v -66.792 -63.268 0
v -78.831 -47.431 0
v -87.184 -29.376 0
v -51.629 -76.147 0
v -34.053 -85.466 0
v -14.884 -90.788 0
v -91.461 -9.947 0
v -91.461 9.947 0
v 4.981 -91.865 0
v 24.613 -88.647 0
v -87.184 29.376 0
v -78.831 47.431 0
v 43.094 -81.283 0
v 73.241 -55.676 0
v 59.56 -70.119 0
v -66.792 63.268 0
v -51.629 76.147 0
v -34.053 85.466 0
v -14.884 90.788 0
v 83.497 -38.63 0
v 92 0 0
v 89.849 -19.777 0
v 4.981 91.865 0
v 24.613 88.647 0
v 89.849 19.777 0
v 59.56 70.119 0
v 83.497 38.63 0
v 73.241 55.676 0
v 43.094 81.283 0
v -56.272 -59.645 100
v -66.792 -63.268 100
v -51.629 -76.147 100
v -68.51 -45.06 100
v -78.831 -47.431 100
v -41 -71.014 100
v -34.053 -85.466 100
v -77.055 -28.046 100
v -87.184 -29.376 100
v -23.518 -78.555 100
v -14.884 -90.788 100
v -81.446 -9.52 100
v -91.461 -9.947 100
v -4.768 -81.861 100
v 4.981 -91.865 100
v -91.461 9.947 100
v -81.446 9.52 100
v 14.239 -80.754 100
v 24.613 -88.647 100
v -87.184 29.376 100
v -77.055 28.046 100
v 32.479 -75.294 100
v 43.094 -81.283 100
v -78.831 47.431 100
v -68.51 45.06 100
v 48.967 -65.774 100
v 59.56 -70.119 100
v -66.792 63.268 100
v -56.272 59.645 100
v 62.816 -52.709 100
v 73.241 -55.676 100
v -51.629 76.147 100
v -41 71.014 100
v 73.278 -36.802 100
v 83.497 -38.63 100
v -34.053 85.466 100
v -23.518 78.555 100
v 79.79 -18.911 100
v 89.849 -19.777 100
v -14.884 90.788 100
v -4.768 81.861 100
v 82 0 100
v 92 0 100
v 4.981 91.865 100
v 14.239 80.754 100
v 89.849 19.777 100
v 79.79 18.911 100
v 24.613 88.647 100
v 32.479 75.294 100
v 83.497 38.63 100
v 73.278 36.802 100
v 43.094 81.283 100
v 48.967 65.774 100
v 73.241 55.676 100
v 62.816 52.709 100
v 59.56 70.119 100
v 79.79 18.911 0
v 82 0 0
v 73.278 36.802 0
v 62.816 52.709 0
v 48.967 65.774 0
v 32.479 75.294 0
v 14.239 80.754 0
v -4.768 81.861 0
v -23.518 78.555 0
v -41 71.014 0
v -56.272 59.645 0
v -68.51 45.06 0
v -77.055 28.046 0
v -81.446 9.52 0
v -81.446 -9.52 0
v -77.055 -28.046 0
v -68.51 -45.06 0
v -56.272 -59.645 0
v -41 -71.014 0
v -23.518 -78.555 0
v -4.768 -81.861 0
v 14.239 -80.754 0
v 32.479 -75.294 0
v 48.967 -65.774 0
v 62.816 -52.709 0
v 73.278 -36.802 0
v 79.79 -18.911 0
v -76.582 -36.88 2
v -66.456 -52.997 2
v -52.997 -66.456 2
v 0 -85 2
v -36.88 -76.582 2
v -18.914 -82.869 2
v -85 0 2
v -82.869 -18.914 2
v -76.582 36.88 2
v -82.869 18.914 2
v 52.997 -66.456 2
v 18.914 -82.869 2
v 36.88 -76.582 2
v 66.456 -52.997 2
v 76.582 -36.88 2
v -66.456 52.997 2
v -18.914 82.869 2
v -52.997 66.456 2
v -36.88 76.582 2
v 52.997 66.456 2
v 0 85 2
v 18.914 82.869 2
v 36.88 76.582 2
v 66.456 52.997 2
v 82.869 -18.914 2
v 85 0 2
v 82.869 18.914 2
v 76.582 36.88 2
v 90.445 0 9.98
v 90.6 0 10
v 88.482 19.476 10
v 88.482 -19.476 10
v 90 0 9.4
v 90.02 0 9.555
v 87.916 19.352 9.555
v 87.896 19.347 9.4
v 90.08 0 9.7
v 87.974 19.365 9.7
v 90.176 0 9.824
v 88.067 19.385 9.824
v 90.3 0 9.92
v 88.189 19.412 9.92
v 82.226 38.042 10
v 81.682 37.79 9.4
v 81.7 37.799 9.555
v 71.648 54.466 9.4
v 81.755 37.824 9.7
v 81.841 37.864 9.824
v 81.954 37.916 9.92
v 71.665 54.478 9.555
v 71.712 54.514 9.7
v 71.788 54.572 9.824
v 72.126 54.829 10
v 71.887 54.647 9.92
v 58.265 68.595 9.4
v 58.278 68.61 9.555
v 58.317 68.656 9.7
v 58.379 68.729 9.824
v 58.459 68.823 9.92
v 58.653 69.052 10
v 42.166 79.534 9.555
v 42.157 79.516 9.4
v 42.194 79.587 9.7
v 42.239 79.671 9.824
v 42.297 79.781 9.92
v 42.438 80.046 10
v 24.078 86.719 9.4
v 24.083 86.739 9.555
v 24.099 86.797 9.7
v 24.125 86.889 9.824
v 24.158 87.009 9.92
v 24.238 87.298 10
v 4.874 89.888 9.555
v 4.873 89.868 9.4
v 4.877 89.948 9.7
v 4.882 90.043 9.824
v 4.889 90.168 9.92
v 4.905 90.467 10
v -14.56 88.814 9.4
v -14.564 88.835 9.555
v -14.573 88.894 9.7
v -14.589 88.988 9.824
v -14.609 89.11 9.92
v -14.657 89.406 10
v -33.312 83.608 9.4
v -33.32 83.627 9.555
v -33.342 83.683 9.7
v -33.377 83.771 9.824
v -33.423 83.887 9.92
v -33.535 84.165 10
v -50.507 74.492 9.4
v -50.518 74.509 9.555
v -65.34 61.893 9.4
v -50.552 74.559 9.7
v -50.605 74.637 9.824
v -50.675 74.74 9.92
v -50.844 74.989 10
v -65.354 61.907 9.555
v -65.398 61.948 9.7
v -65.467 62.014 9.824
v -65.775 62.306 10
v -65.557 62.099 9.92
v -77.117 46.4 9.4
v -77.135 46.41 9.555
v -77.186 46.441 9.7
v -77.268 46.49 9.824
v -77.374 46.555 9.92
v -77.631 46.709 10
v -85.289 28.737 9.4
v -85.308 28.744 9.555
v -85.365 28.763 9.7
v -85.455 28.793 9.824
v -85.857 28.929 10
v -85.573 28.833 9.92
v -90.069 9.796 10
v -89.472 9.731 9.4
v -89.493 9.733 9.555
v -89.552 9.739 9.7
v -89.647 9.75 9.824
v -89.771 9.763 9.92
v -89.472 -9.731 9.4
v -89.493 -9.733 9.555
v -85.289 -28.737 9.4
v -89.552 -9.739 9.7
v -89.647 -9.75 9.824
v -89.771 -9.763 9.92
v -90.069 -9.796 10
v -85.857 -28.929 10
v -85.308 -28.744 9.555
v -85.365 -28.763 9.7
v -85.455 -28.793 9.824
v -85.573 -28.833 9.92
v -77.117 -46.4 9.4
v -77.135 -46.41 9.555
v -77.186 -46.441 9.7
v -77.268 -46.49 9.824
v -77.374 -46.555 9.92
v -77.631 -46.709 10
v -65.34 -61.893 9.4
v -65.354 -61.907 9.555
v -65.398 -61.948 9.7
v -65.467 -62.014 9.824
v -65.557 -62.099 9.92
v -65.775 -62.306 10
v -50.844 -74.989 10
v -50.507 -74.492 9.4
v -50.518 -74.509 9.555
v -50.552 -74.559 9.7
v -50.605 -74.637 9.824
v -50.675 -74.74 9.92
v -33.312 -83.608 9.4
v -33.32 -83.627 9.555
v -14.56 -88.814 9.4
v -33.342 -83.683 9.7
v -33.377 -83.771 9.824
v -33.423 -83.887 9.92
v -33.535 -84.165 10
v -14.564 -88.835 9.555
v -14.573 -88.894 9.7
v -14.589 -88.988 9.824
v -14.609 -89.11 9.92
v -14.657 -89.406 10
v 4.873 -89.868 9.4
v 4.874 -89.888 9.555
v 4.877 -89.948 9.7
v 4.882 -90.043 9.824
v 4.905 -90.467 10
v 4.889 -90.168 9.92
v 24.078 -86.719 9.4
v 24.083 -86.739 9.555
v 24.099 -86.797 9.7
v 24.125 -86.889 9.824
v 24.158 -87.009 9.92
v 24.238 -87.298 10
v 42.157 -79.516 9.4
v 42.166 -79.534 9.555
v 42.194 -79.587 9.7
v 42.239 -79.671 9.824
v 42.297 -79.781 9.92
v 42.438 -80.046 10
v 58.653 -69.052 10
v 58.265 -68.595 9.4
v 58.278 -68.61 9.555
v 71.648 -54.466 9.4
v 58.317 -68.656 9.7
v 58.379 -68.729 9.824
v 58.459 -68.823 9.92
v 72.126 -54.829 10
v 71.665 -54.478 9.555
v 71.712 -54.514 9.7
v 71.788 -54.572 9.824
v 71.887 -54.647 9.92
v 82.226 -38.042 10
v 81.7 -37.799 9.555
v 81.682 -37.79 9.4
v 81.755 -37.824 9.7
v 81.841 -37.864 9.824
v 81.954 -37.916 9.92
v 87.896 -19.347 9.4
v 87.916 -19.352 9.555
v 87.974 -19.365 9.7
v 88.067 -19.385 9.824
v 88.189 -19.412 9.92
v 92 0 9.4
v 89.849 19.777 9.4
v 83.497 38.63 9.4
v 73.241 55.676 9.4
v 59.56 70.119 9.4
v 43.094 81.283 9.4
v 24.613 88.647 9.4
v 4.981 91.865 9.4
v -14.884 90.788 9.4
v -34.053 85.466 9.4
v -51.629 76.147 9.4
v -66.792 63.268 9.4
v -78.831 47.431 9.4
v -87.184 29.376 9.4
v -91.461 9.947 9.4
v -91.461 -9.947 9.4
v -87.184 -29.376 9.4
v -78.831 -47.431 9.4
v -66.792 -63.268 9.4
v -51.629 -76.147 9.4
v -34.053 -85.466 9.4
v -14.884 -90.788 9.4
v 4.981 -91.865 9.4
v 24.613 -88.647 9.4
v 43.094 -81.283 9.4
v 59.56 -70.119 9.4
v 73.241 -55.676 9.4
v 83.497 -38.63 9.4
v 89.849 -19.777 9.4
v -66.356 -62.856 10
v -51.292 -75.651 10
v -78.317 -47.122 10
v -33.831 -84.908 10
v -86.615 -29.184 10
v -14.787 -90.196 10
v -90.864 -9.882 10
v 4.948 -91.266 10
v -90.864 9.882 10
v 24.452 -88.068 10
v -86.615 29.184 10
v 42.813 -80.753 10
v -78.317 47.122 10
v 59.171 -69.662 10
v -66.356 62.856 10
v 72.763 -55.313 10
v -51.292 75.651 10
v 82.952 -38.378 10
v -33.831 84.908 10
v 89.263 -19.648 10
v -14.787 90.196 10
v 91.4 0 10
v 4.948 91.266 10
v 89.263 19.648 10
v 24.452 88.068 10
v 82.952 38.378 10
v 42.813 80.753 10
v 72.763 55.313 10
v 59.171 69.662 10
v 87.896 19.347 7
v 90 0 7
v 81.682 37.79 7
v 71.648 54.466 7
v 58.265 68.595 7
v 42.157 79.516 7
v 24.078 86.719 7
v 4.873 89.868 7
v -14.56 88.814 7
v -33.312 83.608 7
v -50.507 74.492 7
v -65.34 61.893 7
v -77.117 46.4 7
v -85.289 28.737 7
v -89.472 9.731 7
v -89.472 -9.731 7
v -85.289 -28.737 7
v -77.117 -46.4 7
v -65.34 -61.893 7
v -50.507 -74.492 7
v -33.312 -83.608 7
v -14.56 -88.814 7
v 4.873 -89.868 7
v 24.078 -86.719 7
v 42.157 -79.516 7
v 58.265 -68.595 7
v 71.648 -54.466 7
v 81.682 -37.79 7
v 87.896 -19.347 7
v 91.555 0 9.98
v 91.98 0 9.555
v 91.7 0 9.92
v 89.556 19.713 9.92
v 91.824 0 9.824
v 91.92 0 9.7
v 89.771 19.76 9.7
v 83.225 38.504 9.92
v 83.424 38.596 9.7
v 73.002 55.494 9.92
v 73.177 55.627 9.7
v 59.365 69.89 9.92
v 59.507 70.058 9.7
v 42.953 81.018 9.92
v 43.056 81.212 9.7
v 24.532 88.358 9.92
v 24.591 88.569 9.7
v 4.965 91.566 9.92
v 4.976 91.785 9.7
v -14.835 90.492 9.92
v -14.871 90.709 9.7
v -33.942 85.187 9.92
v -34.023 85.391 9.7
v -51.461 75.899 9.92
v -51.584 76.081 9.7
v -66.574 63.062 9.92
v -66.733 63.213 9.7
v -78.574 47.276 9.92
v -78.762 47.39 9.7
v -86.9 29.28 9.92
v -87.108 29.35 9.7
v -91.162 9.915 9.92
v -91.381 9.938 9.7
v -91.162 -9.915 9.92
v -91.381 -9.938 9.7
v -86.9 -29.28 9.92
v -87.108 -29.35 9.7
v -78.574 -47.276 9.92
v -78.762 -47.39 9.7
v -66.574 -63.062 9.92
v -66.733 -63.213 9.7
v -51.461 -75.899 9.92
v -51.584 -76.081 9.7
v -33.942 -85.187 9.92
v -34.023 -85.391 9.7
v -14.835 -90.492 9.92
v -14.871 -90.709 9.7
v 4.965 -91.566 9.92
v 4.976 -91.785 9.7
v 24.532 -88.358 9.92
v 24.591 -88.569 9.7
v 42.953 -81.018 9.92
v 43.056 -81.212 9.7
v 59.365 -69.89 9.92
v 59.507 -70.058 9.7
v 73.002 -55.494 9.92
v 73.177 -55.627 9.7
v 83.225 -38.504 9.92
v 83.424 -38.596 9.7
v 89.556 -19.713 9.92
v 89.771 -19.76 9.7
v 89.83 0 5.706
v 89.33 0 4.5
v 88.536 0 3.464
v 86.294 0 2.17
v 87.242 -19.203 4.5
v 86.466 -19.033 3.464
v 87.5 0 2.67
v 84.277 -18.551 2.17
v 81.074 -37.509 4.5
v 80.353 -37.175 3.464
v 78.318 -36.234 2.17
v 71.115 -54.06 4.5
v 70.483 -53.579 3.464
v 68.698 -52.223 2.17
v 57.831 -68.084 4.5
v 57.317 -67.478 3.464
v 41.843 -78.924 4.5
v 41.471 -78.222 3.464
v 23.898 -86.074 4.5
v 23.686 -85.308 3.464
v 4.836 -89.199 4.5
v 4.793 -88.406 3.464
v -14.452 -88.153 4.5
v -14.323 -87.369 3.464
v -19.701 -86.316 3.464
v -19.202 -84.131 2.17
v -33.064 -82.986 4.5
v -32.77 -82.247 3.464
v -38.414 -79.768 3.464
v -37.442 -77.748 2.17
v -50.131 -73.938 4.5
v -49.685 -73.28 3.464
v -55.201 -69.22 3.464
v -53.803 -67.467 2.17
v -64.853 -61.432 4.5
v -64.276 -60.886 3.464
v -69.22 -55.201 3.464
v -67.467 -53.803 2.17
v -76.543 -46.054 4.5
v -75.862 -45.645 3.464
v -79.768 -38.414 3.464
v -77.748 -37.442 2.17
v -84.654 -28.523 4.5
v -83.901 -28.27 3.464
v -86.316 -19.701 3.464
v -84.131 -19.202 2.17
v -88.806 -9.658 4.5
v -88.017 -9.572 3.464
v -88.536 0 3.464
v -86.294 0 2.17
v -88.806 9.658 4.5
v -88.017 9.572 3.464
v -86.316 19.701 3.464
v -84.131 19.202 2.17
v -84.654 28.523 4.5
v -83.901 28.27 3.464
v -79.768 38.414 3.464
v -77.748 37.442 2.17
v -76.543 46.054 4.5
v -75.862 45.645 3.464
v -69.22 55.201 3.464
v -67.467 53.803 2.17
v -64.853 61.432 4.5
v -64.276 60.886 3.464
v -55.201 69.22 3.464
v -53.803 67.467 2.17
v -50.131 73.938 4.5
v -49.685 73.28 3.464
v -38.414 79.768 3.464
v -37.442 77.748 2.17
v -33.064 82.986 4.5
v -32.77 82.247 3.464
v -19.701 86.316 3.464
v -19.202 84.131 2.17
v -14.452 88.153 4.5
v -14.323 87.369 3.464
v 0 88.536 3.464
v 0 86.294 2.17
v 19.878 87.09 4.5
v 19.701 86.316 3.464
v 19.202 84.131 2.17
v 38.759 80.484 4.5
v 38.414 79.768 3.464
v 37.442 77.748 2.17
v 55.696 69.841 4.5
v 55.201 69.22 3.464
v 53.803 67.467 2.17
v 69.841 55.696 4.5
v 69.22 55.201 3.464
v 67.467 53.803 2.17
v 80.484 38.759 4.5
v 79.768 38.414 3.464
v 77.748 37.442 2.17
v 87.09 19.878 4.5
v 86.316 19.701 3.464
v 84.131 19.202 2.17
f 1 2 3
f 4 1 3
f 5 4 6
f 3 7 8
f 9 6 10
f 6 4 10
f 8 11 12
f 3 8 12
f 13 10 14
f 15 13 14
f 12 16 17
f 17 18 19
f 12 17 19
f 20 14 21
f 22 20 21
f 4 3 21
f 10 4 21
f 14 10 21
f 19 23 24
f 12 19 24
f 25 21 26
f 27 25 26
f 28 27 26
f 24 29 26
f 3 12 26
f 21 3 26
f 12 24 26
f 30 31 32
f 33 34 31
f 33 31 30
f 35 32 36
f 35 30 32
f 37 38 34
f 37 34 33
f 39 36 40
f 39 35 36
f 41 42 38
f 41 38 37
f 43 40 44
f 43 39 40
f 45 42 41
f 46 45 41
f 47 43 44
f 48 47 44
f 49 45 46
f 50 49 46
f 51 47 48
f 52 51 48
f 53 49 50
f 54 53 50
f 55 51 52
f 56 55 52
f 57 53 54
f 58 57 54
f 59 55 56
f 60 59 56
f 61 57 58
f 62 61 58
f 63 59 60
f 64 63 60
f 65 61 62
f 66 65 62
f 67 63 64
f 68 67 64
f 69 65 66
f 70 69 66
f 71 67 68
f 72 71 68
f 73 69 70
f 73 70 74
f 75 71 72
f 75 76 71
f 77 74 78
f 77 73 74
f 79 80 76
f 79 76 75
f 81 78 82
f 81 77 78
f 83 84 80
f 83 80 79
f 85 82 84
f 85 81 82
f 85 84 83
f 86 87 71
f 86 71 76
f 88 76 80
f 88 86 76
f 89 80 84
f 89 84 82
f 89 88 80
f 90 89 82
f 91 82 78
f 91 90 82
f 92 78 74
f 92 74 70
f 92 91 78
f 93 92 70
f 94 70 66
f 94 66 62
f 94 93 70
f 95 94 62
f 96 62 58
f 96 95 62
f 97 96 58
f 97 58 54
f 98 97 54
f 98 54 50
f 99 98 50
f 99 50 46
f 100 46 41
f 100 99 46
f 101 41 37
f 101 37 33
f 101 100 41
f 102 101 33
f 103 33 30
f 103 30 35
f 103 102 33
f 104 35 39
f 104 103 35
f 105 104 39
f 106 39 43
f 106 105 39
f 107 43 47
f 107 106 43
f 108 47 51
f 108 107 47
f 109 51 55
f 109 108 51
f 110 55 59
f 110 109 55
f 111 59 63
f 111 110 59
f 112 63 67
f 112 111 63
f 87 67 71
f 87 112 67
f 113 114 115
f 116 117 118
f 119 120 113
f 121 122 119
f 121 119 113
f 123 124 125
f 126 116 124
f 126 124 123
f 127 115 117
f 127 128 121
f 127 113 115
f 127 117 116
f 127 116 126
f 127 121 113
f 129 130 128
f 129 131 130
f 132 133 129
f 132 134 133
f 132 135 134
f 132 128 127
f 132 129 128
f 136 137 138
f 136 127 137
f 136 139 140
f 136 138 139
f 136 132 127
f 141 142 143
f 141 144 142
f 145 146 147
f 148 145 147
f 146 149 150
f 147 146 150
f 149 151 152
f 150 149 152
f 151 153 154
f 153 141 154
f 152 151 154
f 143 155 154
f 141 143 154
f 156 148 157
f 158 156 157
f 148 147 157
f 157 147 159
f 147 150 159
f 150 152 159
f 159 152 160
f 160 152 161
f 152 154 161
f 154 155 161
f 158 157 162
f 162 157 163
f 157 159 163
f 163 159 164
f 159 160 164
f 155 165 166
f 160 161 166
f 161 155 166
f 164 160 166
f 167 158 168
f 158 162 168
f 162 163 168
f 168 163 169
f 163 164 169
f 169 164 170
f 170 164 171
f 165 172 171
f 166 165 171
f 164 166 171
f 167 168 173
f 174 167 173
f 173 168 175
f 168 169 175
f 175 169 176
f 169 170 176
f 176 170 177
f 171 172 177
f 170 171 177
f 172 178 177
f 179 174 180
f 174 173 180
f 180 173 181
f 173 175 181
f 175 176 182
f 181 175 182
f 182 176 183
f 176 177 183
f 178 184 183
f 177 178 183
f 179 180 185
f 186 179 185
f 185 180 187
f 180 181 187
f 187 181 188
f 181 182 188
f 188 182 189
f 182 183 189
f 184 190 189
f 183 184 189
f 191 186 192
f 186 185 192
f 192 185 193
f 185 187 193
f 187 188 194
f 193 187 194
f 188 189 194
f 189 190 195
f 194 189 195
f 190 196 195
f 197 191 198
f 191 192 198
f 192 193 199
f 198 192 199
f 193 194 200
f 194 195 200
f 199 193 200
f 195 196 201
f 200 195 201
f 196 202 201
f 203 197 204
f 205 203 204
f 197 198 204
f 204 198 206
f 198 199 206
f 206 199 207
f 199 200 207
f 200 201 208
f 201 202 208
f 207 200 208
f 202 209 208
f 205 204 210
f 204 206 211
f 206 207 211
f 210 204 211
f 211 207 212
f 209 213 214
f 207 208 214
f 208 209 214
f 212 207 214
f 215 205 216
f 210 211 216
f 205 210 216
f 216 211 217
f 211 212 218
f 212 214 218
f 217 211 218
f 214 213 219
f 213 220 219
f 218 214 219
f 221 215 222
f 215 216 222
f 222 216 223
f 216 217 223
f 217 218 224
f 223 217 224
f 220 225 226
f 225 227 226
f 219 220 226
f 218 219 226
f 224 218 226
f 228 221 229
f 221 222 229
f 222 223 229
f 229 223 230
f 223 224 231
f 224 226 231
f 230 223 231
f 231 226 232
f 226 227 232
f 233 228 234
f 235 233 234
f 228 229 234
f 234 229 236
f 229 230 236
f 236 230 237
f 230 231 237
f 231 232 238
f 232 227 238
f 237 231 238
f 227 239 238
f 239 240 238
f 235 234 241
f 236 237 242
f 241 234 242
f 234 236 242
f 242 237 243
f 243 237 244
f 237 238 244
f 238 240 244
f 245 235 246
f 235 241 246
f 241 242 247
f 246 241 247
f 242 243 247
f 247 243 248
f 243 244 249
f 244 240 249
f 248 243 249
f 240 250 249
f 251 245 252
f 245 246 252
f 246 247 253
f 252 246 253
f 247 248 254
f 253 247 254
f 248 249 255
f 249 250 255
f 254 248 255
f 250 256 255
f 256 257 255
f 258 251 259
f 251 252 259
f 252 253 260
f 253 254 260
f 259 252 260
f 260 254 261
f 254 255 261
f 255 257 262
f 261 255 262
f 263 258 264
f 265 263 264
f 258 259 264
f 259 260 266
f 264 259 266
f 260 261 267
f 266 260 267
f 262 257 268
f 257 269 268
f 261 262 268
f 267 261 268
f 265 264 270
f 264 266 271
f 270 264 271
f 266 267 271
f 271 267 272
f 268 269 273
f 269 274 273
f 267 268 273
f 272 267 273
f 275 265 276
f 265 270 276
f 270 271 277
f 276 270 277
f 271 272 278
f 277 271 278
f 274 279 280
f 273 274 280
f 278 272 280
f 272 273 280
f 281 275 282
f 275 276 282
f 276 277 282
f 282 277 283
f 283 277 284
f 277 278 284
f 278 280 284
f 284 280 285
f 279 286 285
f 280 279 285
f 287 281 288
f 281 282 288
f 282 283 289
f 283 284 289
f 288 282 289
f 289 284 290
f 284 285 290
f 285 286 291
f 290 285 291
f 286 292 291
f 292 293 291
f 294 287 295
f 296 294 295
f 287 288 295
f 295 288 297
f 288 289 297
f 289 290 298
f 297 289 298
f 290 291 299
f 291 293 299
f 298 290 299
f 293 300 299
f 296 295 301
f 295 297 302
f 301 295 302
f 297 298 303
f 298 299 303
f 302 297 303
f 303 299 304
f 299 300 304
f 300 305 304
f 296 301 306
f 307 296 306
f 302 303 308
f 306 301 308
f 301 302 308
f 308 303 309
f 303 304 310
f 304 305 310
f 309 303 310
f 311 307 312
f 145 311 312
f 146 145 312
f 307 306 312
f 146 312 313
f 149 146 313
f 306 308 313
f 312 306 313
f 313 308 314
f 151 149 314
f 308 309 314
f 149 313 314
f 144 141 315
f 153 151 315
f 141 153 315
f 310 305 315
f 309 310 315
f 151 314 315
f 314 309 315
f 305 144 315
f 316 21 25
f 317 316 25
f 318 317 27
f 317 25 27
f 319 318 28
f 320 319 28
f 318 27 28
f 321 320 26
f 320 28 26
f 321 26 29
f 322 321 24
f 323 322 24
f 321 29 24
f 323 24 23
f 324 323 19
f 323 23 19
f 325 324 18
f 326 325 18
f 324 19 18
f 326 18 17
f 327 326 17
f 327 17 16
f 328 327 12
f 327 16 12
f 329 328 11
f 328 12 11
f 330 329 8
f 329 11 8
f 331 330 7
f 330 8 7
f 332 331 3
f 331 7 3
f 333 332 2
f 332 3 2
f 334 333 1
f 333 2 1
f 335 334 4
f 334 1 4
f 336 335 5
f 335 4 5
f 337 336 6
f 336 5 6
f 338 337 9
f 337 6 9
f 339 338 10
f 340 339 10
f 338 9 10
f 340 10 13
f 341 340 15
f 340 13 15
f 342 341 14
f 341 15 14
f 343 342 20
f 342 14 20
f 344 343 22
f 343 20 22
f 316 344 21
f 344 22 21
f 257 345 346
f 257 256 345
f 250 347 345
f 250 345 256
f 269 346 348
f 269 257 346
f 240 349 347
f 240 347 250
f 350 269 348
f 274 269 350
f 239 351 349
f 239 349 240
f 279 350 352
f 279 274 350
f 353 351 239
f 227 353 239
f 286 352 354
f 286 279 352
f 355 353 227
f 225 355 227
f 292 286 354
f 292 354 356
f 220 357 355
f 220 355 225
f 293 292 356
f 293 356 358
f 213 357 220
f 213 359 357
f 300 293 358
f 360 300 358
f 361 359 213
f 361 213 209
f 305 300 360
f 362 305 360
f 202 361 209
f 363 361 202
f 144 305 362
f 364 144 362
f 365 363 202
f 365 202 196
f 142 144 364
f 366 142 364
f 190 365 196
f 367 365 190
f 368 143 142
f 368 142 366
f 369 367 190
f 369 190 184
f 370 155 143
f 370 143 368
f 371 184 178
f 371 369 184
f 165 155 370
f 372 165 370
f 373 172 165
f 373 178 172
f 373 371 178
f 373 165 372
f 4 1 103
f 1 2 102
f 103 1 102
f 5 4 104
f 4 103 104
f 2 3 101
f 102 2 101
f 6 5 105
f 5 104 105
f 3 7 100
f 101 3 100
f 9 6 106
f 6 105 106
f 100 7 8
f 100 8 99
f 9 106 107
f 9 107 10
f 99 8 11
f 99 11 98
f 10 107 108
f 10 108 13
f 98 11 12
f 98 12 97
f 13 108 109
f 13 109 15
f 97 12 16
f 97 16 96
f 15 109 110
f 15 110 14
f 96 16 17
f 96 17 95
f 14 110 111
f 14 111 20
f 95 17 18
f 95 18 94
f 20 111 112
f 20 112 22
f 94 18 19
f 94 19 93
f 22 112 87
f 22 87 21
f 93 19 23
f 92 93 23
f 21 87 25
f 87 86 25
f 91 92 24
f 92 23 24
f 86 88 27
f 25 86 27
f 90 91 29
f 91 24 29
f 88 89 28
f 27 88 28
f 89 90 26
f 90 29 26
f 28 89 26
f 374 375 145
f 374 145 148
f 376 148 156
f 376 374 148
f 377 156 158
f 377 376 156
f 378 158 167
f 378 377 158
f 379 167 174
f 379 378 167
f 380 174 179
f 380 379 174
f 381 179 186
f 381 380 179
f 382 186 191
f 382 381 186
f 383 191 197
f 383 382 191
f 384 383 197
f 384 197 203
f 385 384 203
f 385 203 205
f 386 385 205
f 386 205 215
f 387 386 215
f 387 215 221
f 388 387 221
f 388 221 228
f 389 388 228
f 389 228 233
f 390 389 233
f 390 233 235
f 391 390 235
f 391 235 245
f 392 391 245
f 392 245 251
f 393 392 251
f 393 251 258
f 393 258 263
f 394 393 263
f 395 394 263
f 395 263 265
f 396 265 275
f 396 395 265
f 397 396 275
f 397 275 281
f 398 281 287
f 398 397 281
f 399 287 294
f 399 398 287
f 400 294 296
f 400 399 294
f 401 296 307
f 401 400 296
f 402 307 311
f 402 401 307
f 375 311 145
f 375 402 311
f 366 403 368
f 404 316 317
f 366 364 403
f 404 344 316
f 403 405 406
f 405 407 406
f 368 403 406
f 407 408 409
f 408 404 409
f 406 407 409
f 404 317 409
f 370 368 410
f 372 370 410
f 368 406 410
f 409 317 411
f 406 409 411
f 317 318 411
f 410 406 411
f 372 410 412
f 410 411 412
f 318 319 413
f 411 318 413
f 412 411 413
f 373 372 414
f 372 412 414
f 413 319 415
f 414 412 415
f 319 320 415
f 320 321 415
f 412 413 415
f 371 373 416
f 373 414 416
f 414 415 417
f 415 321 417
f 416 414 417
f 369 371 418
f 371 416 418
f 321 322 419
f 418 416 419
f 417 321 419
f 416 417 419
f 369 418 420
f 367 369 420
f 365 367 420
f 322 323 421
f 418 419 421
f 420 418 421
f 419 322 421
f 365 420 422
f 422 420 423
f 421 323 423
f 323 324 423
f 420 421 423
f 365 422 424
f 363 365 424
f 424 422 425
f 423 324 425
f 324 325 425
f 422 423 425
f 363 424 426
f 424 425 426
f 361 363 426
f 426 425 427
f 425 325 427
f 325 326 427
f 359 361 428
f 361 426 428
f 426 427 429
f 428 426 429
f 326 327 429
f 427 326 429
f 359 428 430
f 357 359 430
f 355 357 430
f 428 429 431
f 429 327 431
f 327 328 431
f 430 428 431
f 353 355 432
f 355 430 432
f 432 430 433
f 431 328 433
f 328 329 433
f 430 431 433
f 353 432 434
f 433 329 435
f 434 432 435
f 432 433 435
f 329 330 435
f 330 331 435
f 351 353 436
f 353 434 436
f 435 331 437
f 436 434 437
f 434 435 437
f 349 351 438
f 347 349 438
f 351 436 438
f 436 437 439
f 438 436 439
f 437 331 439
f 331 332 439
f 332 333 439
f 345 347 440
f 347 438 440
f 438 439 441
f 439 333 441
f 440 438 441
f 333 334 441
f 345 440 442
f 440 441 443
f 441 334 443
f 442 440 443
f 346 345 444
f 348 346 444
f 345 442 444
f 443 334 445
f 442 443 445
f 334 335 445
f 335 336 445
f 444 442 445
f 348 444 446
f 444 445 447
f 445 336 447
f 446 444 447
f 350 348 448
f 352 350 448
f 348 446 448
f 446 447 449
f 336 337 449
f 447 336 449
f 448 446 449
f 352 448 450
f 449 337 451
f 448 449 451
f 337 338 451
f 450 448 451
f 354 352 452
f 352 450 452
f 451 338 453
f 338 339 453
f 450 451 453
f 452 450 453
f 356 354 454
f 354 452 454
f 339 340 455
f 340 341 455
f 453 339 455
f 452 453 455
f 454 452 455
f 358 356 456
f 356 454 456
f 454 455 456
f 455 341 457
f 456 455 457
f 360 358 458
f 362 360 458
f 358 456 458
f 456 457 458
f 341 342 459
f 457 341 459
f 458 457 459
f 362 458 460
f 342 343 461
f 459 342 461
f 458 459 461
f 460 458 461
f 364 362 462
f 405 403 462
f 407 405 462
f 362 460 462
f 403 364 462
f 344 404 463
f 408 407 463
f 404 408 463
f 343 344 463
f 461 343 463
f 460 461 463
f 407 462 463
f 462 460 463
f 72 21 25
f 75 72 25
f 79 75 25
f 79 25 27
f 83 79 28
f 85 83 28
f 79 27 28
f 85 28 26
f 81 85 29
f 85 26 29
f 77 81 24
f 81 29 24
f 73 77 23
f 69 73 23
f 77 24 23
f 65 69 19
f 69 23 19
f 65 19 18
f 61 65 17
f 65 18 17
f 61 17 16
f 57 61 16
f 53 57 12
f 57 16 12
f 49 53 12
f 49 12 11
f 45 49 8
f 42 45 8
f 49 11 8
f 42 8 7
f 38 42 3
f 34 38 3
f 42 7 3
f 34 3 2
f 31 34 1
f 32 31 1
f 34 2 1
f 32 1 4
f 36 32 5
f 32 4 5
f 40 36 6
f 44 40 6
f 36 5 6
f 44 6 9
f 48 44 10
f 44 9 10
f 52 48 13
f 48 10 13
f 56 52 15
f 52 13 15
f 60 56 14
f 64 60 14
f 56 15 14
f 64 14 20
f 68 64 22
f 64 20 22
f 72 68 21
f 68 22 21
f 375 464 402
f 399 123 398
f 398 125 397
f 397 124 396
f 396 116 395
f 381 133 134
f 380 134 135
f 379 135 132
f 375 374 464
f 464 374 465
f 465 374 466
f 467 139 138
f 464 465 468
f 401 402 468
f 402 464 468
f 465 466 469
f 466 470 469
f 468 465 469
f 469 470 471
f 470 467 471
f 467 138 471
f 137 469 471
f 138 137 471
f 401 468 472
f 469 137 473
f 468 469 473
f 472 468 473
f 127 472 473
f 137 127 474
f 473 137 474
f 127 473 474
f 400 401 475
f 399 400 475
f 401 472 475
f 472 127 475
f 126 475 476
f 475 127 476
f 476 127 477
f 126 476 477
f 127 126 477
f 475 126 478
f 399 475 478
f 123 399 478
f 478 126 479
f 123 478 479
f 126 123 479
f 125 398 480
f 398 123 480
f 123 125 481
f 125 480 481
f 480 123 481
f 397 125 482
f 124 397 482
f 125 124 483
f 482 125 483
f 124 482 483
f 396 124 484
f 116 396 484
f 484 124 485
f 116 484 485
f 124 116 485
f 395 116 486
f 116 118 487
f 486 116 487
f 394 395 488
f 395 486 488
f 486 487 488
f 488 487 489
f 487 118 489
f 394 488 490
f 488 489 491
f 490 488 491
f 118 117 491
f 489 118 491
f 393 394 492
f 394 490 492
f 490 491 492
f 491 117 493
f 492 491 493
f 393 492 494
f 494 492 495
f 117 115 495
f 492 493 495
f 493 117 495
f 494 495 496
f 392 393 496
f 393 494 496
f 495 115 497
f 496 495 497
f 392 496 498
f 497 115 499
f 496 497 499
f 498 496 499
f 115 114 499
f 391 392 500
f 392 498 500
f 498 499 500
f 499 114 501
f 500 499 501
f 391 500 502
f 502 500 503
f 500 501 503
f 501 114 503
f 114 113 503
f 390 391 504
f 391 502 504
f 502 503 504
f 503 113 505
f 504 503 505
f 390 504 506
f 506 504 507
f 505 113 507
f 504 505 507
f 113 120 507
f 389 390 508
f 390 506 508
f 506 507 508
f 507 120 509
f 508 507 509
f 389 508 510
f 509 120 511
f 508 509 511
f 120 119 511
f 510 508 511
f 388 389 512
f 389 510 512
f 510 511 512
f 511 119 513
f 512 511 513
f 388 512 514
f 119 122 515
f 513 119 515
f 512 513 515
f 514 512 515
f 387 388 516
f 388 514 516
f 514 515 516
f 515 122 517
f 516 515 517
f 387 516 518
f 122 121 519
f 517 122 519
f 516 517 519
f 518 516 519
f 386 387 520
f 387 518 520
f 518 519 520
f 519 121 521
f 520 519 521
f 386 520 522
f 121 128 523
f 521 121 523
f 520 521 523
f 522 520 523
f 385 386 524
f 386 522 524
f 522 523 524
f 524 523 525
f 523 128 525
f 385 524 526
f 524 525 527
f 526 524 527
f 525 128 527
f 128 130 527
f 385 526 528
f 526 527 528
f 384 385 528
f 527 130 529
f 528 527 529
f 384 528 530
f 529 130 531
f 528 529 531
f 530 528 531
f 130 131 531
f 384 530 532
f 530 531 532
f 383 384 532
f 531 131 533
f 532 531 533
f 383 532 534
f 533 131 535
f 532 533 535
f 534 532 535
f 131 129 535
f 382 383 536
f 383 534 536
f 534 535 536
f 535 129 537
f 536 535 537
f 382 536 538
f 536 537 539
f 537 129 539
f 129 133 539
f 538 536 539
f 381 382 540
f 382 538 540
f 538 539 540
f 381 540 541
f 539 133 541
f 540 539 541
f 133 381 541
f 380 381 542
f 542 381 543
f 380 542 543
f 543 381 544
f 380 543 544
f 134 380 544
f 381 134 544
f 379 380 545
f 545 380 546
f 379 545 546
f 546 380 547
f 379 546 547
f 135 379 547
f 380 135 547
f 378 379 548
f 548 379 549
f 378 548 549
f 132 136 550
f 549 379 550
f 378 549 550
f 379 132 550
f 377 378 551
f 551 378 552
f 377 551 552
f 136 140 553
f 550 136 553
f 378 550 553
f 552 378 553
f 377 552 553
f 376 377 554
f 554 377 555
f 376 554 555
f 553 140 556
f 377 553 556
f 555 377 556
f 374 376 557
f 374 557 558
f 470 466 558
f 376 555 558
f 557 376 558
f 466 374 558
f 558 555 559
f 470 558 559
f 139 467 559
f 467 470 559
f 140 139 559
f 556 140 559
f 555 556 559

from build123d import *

# Parameters (mm, degrees)
SKETCH_R      = 92
PAD_DEPTH     = 10
THICKNESS_T   = -2
FILLET_R      = 5
FILLET001_R   = 0.6
SKETCH001_R   = 92
SKETCH001_R_2 = 82
PAD001_DEPTH  = 100


with BuildPart() as body:
    # Sketch → Pad (new body)
    with BuildSketch(Plane.XY):
        Circle(SKETCH_R)
    extrude(amount=PAD_DEPTH)

    # Thickness
    thickness_openings = [body.faces().sort_by_distance(p)[0] for p in [
        (0, 0, 10),
    ]]
    offset(amount=THICKNESS_T, openings=thickness_openings)

    # Fillet
    fillet_edges = [body.edges().sort_by_distance(p)[0] for p in [
        (-90, 0, 2),
    ]]
    fillet(fillet_edges, radius=FILLET_R)

    # Fillet001
    fillet001_edges = [body.edges().sort_by_distance(p)[0] for p in [
        (-92, 0, 10),
        (-90, 0, 10),
    ]]
    fillet(fillet001_edges, radius=FILLET001_R)


with BuildPart() as body001:
    # Sketch001 → Pad001 (new body)
    with BuildSketch(Plane.XY):
        Circle(SKETCH001_R)
        Circle(SKETCH001_R_2, mode=Mode.SUBTRACT)
    extrude(amount=PAD001_DEPTH)


solid = Compound([body.part, body001.part])
